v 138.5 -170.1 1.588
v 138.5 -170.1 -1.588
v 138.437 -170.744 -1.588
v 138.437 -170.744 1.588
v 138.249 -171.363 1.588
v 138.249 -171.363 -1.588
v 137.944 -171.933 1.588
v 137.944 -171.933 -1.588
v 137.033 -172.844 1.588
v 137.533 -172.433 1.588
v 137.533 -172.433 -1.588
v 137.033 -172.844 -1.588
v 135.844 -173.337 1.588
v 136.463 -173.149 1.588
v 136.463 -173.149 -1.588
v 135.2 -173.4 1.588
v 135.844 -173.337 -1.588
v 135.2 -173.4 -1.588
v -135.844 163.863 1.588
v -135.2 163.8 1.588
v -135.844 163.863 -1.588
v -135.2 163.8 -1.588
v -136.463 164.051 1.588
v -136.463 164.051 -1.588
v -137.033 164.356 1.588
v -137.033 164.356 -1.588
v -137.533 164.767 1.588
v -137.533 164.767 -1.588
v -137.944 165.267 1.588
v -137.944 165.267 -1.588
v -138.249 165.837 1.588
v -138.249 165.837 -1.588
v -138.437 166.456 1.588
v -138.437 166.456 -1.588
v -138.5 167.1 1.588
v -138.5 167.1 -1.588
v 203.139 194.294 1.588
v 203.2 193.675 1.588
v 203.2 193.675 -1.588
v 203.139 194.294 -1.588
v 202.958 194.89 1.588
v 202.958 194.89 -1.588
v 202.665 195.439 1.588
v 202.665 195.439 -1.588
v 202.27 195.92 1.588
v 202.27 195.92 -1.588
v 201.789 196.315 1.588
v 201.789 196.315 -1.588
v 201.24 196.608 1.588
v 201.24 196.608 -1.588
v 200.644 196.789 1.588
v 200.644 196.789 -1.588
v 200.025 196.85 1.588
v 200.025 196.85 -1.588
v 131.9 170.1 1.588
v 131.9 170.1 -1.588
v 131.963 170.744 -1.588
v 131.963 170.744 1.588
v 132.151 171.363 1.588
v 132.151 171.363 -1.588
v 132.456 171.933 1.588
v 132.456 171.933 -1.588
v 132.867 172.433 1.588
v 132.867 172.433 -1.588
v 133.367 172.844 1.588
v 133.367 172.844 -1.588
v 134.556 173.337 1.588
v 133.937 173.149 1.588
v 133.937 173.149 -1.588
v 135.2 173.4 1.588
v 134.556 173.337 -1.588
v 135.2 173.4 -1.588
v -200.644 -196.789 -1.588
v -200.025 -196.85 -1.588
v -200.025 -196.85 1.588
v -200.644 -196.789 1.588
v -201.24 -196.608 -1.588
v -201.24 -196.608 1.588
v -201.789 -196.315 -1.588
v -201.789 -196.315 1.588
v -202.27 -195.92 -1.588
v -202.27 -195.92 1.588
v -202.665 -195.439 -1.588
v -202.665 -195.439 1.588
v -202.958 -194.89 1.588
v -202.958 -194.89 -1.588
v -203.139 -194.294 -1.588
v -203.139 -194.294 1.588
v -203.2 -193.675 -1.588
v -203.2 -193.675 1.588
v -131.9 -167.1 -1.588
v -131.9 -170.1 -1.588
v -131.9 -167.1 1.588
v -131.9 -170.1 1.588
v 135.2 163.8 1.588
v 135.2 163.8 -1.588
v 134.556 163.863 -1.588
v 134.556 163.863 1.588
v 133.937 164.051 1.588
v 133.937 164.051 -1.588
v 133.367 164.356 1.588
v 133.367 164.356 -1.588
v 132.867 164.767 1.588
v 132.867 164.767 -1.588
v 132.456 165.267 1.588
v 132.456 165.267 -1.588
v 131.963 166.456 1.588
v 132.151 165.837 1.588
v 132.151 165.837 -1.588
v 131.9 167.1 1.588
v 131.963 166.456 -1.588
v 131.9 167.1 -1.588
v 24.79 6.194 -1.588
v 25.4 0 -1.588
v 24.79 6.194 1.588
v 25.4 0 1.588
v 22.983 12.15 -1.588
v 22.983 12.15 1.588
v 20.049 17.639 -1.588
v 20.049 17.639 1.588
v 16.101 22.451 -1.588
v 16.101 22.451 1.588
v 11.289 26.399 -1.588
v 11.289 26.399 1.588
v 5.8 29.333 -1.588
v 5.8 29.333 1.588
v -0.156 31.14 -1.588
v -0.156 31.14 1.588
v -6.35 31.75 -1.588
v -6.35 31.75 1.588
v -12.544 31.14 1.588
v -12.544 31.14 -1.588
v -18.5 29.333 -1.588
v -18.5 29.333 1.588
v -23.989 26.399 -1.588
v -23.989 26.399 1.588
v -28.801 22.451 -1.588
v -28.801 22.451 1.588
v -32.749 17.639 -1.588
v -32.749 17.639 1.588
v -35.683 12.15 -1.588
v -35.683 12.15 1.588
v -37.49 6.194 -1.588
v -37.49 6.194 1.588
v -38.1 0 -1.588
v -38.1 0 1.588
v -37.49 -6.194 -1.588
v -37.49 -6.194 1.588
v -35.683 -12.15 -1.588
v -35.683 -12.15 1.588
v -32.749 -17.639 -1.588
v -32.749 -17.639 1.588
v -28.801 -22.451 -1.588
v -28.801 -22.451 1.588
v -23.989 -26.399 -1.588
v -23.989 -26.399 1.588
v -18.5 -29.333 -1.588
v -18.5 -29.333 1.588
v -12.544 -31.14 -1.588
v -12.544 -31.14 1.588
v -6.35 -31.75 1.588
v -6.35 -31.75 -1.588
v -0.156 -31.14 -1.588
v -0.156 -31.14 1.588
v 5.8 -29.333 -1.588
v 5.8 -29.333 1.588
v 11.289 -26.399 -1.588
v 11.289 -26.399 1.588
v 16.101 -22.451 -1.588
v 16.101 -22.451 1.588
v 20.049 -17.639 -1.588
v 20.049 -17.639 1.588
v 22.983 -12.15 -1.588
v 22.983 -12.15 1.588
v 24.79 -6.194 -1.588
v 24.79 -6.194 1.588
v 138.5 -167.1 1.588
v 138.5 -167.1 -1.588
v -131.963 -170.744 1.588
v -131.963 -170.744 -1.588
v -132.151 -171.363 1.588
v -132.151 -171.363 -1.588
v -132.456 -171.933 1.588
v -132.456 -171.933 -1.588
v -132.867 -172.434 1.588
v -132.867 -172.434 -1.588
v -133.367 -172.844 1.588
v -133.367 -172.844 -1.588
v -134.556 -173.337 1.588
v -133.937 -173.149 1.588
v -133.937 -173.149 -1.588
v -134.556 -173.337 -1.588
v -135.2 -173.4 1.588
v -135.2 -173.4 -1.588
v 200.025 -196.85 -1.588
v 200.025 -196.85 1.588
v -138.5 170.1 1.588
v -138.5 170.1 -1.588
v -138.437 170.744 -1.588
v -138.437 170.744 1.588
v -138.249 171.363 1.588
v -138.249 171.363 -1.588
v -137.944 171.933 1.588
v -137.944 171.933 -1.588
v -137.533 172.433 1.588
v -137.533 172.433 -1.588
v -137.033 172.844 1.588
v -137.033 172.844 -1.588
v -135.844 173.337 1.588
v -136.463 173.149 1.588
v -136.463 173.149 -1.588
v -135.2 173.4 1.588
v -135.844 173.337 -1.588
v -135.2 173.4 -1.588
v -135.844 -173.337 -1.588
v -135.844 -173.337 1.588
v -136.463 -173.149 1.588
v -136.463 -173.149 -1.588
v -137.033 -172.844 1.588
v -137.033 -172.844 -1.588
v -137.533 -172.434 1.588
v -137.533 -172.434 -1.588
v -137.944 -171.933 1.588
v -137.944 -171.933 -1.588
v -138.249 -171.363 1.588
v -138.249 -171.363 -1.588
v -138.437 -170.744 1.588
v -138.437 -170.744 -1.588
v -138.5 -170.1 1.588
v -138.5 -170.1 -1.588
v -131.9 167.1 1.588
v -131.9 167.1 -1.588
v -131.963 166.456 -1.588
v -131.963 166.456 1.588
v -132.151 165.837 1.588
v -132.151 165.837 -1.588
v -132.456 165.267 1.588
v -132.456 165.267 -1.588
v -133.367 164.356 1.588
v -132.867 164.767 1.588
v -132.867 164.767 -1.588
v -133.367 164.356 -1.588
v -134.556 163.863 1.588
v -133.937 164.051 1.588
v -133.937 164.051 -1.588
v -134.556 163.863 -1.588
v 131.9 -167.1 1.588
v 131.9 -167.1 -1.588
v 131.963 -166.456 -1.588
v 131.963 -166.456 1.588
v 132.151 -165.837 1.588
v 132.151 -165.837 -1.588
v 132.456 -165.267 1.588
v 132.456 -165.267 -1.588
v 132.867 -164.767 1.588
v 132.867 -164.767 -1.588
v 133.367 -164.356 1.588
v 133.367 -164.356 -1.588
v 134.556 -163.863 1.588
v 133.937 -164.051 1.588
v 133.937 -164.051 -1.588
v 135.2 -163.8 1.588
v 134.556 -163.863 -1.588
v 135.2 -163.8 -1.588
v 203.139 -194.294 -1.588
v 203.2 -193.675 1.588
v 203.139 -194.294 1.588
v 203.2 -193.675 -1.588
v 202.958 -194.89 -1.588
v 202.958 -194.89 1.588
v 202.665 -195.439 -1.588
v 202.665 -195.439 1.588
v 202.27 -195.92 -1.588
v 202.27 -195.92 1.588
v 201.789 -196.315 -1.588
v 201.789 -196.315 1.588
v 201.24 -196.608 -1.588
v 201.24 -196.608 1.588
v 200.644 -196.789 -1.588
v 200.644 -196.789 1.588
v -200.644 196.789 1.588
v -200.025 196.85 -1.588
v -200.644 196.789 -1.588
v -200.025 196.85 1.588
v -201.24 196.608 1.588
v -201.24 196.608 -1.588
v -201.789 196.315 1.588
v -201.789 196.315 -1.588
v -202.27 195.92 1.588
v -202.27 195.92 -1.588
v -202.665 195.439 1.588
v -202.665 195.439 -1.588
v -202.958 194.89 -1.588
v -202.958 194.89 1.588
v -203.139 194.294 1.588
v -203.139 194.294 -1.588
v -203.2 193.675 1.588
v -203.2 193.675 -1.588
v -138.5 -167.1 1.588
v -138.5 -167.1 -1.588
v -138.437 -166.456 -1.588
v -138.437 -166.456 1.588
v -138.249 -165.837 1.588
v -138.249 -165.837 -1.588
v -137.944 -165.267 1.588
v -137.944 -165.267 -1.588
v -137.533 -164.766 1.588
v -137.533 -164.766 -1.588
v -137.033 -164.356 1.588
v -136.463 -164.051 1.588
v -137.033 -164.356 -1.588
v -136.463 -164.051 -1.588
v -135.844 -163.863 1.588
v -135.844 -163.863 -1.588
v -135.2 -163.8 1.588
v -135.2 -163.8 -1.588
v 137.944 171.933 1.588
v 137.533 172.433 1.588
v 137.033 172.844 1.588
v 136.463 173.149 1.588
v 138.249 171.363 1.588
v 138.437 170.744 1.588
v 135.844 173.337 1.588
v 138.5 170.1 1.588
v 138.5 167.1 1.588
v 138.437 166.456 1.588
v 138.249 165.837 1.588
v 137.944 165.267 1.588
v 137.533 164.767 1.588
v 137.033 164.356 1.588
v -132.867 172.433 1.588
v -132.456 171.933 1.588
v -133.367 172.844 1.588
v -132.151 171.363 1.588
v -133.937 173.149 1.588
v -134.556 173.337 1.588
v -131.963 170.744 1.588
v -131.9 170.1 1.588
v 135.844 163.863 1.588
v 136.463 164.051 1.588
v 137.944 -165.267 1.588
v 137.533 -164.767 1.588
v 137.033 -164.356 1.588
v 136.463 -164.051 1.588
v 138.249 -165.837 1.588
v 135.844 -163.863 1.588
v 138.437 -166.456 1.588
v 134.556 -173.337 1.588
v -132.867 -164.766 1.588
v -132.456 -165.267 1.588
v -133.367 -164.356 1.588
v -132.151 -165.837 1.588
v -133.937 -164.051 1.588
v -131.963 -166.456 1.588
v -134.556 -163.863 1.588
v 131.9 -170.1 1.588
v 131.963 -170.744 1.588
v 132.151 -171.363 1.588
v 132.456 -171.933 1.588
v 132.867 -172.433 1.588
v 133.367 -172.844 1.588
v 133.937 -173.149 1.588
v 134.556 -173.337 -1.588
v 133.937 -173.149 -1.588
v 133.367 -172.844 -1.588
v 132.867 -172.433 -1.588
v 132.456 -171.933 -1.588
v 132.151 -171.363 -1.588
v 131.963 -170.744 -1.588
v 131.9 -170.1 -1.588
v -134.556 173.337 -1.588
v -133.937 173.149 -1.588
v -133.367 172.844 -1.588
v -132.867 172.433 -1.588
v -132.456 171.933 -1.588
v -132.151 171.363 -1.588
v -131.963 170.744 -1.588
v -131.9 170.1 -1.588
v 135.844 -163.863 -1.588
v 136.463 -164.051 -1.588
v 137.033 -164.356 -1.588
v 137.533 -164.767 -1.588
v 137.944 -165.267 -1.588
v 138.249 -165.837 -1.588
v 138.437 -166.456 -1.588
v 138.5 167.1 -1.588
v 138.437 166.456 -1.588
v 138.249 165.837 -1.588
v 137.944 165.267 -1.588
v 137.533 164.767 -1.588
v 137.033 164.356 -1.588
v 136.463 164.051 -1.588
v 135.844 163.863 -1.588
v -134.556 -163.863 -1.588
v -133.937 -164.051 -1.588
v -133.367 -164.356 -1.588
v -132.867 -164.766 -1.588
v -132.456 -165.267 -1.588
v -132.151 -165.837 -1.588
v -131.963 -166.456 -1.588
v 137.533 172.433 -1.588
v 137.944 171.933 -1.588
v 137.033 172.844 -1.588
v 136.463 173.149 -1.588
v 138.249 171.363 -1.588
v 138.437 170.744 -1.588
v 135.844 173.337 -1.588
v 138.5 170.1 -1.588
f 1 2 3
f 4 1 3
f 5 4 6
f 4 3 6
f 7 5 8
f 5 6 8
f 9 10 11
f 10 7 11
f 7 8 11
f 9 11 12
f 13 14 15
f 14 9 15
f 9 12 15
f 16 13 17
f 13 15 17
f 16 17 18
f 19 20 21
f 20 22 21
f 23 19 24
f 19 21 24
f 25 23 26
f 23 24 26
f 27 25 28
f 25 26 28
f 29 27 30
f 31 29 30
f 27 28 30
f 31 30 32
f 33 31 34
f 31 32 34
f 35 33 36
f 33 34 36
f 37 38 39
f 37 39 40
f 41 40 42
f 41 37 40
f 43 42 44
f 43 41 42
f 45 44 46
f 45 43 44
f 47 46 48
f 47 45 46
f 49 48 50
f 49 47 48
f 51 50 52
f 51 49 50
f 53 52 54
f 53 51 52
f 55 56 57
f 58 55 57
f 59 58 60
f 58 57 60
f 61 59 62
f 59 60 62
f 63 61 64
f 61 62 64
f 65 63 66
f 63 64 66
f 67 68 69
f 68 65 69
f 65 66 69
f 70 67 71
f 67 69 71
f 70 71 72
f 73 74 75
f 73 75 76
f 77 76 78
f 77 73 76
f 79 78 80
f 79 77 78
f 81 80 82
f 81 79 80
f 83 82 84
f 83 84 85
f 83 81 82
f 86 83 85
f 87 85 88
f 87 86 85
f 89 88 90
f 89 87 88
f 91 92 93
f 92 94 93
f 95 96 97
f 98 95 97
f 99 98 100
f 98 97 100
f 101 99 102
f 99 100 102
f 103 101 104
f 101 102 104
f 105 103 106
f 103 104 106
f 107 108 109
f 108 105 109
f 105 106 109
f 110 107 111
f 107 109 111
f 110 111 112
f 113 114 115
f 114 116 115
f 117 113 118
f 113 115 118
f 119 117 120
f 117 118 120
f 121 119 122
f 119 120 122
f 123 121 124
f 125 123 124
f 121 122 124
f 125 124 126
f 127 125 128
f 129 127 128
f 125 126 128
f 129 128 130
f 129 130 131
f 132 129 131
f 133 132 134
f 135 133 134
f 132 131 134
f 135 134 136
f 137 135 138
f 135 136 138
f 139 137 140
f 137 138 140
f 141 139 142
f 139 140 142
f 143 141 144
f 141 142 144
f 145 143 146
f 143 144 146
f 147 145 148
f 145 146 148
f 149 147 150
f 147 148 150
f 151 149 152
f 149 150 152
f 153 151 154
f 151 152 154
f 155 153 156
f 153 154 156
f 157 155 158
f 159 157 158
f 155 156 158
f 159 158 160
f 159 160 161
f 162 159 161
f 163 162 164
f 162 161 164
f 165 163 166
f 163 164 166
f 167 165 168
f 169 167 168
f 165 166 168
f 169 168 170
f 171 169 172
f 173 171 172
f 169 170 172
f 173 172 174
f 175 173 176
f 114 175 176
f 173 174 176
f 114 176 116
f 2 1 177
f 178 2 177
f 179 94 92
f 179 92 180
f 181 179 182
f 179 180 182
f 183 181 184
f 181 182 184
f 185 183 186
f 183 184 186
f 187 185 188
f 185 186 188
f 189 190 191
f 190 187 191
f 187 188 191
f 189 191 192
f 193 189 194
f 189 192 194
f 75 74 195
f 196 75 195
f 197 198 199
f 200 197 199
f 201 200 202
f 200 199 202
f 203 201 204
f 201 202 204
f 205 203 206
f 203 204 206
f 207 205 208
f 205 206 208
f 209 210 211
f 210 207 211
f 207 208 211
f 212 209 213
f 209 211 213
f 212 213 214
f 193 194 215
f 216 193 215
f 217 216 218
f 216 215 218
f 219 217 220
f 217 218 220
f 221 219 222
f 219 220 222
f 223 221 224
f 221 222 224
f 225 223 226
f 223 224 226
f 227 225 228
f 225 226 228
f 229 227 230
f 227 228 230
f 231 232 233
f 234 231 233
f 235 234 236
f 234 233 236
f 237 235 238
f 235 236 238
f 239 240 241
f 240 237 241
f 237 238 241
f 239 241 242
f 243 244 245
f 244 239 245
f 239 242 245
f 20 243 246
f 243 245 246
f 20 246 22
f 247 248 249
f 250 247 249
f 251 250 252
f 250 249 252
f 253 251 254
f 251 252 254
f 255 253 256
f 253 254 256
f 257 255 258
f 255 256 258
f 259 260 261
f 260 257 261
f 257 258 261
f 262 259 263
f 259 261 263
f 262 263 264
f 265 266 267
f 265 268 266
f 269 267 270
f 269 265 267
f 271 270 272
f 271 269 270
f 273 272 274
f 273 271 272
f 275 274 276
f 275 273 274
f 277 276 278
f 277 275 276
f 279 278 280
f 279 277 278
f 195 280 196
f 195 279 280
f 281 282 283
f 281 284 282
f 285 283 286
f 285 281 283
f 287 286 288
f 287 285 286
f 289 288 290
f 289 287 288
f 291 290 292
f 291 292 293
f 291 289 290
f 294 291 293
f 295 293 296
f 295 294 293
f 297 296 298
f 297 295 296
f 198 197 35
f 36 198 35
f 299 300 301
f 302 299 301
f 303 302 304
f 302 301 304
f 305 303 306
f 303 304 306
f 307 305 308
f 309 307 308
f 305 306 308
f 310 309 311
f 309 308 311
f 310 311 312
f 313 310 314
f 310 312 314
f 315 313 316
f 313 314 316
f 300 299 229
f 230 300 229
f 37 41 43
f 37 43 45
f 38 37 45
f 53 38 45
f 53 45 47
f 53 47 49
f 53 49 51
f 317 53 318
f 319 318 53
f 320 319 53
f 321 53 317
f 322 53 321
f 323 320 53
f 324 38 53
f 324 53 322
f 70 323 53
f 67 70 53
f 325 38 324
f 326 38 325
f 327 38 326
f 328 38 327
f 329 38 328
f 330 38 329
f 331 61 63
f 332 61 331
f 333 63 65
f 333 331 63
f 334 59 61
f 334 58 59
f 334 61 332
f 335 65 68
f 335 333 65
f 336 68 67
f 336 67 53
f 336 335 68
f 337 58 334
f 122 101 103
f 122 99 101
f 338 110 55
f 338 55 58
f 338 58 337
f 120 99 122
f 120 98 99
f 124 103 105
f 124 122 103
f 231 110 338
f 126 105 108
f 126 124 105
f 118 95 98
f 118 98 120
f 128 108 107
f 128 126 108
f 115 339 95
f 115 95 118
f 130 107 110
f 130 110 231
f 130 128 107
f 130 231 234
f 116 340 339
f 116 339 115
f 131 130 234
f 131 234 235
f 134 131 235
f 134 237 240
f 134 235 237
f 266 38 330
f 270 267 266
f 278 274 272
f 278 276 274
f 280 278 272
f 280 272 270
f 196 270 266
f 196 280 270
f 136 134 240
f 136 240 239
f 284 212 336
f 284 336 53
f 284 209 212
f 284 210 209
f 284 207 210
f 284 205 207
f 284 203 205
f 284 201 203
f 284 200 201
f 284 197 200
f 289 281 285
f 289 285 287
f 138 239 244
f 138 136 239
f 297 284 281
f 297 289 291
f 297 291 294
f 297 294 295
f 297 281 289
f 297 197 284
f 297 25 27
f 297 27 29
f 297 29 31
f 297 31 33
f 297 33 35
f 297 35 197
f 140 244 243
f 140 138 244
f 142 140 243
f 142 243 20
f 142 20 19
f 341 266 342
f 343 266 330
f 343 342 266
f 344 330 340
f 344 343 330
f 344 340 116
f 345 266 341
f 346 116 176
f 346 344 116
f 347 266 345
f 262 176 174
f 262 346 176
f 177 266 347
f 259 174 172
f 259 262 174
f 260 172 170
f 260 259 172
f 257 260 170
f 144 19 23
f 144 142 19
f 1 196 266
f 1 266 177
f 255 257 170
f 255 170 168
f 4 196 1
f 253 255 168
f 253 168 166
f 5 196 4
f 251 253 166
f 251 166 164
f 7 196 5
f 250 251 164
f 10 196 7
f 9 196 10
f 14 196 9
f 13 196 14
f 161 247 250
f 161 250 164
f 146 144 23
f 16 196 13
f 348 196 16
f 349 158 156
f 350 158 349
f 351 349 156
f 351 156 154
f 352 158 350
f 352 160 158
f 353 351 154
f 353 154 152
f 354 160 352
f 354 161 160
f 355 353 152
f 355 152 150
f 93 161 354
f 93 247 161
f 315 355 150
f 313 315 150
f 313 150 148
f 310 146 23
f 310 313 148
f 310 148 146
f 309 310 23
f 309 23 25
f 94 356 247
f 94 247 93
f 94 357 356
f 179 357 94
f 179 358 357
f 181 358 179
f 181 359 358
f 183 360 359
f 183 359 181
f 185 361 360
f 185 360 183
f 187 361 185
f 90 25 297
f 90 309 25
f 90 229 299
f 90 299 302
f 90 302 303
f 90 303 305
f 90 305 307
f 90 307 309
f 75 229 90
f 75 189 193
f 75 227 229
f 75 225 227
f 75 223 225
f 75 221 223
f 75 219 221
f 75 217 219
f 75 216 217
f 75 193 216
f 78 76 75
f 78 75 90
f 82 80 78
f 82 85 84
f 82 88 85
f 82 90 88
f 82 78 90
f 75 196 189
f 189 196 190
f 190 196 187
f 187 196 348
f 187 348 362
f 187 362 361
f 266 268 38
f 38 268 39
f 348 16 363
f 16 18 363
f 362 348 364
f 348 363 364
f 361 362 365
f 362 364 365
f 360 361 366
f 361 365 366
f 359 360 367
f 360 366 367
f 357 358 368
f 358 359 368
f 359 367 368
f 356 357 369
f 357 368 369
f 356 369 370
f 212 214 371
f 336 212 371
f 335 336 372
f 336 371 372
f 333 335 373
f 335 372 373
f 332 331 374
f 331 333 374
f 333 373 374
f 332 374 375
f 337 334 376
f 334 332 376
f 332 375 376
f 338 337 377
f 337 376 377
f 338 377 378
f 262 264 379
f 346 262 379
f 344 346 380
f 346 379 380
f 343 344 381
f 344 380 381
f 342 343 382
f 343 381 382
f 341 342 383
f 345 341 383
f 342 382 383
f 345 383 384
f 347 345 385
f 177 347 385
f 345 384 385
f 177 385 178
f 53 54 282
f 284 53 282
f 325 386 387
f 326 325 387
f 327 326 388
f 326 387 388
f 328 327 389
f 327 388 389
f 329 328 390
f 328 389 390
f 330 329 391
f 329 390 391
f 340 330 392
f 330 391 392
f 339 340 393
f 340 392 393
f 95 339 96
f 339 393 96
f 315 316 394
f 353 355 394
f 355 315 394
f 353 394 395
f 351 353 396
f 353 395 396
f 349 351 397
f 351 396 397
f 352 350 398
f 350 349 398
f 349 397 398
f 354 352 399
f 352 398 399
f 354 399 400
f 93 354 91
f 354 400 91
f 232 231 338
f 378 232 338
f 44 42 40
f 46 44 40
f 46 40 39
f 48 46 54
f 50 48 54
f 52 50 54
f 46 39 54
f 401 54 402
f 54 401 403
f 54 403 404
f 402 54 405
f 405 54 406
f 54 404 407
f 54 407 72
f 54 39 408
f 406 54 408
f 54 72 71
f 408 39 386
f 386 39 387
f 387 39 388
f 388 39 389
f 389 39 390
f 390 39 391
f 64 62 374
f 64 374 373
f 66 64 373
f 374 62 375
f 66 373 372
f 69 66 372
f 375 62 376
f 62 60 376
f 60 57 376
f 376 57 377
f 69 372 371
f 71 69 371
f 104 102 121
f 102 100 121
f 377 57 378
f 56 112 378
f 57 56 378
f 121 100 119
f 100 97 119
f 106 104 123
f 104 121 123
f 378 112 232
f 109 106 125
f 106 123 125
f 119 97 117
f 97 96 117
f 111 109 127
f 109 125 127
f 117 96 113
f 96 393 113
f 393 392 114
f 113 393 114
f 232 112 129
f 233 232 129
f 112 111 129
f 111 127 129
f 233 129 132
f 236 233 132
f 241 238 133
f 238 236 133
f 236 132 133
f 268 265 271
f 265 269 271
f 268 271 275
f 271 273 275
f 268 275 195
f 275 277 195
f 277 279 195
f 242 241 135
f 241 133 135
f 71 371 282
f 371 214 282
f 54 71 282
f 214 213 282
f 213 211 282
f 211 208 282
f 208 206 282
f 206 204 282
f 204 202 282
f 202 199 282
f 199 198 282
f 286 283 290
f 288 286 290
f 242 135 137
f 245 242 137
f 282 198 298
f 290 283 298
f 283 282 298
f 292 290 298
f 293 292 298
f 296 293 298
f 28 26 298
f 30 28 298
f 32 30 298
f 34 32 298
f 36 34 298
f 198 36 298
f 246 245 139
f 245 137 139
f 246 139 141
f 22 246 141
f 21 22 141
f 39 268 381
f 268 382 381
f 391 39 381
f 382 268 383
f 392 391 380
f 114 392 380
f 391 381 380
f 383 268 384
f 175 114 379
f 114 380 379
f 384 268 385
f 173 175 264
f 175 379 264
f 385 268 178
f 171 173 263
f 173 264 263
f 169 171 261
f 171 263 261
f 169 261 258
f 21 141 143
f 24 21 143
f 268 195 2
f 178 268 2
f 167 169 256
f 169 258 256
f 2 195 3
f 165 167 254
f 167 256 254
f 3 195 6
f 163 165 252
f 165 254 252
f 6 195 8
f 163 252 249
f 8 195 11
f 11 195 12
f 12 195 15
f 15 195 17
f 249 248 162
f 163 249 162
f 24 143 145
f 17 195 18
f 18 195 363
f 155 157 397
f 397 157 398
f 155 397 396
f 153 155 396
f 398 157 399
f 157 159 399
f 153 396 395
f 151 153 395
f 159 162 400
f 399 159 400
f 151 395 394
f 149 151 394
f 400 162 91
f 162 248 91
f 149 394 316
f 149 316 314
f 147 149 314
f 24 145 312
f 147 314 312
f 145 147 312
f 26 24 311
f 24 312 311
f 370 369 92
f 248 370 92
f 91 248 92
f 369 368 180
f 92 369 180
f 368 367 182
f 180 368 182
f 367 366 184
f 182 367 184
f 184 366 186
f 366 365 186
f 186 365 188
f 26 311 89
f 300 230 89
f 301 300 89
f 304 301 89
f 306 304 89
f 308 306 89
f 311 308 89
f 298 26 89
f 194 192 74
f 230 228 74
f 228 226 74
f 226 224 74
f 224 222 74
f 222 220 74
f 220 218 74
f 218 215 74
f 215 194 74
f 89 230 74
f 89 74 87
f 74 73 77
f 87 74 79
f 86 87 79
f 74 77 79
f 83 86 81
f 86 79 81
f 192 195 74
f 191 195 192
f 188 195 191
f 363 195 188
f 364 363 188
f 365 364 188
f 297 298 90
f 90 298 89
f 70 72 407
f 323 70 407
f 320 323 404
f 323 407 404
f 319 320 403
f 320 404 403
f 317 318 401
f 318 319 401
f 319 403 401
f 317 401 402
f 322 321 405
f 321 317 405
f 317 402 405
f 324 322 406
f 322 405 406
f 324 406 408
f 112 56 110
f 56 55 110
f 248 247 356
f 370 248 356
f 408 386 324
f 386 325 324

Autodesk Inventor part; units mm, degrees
ref_plane "YZ Plane" through (0, 0, 0) normal (1, 0, 0) x (0, 1, 0)
ref_plane "XZ Plane" through (0, 0, 0) normal (0, 1, 0) x (-1, 0, 0)
ref_plane "XY Plane" through (0, 0, 0) normal (0, 0, 1) x (1, 0, 0)
sketch "Sketch1" plane through (0, 0, 0) normal (0, 0, 1) x (1, 0, 0)
  line L0 (203.2, 196.85) -> (-203.2, 196.85)
  line L1 (-203.2, 196.85) -> (-203.2, -196.85)
  line L2 (-203.2, -196.85) -> (203.2, -196.85)
  line L3 (203.2, -196.85) -> (203.2, 196.85)
  point P0 (0, 0)
  dimension "d0" = 393.7
  dimension "d1" = 406.4
  dimension "d2" = 203.2
  dimension "d3" = 196.85
extrude "Extrusion1" add sketch "Sketch1" along normal mid plane 3.175
sketch "Sketch2" plane through (0, 0, 1.5875) normal (0, 0, 1) x (1, 0, 0)
  circle A0 centre (-6.35, 0) radius 31.75
  point P0 (0, 0)
  dimension "d6" = 63.5
  dimension "d20" = 6.35
extrude "Extrusion2" cut sketch "Sketch2" against normal through all
fillet "Fillet1" radius 3.175 4 edges at (203.2, -196.85, 0) (-203.2, -196.85, 0) (-203.2, 196.85, 0) (203.2, 196.85, 0)
sketch "Sketch3" plane through (0, 0, 1.5875) normal (0, 0, 1) x (1, 0, 0)
  line L0 (138.5, 173.4) -> (131.9, 173.4)
  line L1 (131.9, 173.4) -> (131.9, 163.8)
  line L2 (131.9, 163.8) -> (138.5, 163.8)
  line L3 (138.5, 163.8) -> (138.5, 173.4)
  line L4 (135.2, 173.4) -> (135.2, 163.8) construction
  line L5 (203.2, -193.675) -> (203.2, 193.675) projected
  line L6 (200.025, 196.85) -> (-200.025, 196.85) projected
  line L7 (138.5, 168.6) -> (131.9, 168.6) construction
  point P0 (0, 0)
  dimension "d11" = 6.6
  dimension "d12" = 68
  dimension "d14" = 9.6
  dimension "d18" = 28.25
extrude "Extrusion3" cut sketch "Sketch3" against normal through all
fillet "Fillet2" radius 3.3 4 edges at (138.5, 173.4, 0) (131.9, 173.4, 0) (138.5, 163.8, 0) (131.9, 163.8, 0)
mirror "Mirror1" about plane through (0, 0, 0) normal (0, 1, 0) of "Extrusion3", "Fillet2"
mirror "Mirror2" about plane through (0, 0, 0) normal (1, 0, 0) of "Extrusion3", "Fillet2", "Mirror1"
equation "\"d2\" = 0.5 * d1"
equation "\"d3\" = 0.5 * d0"
